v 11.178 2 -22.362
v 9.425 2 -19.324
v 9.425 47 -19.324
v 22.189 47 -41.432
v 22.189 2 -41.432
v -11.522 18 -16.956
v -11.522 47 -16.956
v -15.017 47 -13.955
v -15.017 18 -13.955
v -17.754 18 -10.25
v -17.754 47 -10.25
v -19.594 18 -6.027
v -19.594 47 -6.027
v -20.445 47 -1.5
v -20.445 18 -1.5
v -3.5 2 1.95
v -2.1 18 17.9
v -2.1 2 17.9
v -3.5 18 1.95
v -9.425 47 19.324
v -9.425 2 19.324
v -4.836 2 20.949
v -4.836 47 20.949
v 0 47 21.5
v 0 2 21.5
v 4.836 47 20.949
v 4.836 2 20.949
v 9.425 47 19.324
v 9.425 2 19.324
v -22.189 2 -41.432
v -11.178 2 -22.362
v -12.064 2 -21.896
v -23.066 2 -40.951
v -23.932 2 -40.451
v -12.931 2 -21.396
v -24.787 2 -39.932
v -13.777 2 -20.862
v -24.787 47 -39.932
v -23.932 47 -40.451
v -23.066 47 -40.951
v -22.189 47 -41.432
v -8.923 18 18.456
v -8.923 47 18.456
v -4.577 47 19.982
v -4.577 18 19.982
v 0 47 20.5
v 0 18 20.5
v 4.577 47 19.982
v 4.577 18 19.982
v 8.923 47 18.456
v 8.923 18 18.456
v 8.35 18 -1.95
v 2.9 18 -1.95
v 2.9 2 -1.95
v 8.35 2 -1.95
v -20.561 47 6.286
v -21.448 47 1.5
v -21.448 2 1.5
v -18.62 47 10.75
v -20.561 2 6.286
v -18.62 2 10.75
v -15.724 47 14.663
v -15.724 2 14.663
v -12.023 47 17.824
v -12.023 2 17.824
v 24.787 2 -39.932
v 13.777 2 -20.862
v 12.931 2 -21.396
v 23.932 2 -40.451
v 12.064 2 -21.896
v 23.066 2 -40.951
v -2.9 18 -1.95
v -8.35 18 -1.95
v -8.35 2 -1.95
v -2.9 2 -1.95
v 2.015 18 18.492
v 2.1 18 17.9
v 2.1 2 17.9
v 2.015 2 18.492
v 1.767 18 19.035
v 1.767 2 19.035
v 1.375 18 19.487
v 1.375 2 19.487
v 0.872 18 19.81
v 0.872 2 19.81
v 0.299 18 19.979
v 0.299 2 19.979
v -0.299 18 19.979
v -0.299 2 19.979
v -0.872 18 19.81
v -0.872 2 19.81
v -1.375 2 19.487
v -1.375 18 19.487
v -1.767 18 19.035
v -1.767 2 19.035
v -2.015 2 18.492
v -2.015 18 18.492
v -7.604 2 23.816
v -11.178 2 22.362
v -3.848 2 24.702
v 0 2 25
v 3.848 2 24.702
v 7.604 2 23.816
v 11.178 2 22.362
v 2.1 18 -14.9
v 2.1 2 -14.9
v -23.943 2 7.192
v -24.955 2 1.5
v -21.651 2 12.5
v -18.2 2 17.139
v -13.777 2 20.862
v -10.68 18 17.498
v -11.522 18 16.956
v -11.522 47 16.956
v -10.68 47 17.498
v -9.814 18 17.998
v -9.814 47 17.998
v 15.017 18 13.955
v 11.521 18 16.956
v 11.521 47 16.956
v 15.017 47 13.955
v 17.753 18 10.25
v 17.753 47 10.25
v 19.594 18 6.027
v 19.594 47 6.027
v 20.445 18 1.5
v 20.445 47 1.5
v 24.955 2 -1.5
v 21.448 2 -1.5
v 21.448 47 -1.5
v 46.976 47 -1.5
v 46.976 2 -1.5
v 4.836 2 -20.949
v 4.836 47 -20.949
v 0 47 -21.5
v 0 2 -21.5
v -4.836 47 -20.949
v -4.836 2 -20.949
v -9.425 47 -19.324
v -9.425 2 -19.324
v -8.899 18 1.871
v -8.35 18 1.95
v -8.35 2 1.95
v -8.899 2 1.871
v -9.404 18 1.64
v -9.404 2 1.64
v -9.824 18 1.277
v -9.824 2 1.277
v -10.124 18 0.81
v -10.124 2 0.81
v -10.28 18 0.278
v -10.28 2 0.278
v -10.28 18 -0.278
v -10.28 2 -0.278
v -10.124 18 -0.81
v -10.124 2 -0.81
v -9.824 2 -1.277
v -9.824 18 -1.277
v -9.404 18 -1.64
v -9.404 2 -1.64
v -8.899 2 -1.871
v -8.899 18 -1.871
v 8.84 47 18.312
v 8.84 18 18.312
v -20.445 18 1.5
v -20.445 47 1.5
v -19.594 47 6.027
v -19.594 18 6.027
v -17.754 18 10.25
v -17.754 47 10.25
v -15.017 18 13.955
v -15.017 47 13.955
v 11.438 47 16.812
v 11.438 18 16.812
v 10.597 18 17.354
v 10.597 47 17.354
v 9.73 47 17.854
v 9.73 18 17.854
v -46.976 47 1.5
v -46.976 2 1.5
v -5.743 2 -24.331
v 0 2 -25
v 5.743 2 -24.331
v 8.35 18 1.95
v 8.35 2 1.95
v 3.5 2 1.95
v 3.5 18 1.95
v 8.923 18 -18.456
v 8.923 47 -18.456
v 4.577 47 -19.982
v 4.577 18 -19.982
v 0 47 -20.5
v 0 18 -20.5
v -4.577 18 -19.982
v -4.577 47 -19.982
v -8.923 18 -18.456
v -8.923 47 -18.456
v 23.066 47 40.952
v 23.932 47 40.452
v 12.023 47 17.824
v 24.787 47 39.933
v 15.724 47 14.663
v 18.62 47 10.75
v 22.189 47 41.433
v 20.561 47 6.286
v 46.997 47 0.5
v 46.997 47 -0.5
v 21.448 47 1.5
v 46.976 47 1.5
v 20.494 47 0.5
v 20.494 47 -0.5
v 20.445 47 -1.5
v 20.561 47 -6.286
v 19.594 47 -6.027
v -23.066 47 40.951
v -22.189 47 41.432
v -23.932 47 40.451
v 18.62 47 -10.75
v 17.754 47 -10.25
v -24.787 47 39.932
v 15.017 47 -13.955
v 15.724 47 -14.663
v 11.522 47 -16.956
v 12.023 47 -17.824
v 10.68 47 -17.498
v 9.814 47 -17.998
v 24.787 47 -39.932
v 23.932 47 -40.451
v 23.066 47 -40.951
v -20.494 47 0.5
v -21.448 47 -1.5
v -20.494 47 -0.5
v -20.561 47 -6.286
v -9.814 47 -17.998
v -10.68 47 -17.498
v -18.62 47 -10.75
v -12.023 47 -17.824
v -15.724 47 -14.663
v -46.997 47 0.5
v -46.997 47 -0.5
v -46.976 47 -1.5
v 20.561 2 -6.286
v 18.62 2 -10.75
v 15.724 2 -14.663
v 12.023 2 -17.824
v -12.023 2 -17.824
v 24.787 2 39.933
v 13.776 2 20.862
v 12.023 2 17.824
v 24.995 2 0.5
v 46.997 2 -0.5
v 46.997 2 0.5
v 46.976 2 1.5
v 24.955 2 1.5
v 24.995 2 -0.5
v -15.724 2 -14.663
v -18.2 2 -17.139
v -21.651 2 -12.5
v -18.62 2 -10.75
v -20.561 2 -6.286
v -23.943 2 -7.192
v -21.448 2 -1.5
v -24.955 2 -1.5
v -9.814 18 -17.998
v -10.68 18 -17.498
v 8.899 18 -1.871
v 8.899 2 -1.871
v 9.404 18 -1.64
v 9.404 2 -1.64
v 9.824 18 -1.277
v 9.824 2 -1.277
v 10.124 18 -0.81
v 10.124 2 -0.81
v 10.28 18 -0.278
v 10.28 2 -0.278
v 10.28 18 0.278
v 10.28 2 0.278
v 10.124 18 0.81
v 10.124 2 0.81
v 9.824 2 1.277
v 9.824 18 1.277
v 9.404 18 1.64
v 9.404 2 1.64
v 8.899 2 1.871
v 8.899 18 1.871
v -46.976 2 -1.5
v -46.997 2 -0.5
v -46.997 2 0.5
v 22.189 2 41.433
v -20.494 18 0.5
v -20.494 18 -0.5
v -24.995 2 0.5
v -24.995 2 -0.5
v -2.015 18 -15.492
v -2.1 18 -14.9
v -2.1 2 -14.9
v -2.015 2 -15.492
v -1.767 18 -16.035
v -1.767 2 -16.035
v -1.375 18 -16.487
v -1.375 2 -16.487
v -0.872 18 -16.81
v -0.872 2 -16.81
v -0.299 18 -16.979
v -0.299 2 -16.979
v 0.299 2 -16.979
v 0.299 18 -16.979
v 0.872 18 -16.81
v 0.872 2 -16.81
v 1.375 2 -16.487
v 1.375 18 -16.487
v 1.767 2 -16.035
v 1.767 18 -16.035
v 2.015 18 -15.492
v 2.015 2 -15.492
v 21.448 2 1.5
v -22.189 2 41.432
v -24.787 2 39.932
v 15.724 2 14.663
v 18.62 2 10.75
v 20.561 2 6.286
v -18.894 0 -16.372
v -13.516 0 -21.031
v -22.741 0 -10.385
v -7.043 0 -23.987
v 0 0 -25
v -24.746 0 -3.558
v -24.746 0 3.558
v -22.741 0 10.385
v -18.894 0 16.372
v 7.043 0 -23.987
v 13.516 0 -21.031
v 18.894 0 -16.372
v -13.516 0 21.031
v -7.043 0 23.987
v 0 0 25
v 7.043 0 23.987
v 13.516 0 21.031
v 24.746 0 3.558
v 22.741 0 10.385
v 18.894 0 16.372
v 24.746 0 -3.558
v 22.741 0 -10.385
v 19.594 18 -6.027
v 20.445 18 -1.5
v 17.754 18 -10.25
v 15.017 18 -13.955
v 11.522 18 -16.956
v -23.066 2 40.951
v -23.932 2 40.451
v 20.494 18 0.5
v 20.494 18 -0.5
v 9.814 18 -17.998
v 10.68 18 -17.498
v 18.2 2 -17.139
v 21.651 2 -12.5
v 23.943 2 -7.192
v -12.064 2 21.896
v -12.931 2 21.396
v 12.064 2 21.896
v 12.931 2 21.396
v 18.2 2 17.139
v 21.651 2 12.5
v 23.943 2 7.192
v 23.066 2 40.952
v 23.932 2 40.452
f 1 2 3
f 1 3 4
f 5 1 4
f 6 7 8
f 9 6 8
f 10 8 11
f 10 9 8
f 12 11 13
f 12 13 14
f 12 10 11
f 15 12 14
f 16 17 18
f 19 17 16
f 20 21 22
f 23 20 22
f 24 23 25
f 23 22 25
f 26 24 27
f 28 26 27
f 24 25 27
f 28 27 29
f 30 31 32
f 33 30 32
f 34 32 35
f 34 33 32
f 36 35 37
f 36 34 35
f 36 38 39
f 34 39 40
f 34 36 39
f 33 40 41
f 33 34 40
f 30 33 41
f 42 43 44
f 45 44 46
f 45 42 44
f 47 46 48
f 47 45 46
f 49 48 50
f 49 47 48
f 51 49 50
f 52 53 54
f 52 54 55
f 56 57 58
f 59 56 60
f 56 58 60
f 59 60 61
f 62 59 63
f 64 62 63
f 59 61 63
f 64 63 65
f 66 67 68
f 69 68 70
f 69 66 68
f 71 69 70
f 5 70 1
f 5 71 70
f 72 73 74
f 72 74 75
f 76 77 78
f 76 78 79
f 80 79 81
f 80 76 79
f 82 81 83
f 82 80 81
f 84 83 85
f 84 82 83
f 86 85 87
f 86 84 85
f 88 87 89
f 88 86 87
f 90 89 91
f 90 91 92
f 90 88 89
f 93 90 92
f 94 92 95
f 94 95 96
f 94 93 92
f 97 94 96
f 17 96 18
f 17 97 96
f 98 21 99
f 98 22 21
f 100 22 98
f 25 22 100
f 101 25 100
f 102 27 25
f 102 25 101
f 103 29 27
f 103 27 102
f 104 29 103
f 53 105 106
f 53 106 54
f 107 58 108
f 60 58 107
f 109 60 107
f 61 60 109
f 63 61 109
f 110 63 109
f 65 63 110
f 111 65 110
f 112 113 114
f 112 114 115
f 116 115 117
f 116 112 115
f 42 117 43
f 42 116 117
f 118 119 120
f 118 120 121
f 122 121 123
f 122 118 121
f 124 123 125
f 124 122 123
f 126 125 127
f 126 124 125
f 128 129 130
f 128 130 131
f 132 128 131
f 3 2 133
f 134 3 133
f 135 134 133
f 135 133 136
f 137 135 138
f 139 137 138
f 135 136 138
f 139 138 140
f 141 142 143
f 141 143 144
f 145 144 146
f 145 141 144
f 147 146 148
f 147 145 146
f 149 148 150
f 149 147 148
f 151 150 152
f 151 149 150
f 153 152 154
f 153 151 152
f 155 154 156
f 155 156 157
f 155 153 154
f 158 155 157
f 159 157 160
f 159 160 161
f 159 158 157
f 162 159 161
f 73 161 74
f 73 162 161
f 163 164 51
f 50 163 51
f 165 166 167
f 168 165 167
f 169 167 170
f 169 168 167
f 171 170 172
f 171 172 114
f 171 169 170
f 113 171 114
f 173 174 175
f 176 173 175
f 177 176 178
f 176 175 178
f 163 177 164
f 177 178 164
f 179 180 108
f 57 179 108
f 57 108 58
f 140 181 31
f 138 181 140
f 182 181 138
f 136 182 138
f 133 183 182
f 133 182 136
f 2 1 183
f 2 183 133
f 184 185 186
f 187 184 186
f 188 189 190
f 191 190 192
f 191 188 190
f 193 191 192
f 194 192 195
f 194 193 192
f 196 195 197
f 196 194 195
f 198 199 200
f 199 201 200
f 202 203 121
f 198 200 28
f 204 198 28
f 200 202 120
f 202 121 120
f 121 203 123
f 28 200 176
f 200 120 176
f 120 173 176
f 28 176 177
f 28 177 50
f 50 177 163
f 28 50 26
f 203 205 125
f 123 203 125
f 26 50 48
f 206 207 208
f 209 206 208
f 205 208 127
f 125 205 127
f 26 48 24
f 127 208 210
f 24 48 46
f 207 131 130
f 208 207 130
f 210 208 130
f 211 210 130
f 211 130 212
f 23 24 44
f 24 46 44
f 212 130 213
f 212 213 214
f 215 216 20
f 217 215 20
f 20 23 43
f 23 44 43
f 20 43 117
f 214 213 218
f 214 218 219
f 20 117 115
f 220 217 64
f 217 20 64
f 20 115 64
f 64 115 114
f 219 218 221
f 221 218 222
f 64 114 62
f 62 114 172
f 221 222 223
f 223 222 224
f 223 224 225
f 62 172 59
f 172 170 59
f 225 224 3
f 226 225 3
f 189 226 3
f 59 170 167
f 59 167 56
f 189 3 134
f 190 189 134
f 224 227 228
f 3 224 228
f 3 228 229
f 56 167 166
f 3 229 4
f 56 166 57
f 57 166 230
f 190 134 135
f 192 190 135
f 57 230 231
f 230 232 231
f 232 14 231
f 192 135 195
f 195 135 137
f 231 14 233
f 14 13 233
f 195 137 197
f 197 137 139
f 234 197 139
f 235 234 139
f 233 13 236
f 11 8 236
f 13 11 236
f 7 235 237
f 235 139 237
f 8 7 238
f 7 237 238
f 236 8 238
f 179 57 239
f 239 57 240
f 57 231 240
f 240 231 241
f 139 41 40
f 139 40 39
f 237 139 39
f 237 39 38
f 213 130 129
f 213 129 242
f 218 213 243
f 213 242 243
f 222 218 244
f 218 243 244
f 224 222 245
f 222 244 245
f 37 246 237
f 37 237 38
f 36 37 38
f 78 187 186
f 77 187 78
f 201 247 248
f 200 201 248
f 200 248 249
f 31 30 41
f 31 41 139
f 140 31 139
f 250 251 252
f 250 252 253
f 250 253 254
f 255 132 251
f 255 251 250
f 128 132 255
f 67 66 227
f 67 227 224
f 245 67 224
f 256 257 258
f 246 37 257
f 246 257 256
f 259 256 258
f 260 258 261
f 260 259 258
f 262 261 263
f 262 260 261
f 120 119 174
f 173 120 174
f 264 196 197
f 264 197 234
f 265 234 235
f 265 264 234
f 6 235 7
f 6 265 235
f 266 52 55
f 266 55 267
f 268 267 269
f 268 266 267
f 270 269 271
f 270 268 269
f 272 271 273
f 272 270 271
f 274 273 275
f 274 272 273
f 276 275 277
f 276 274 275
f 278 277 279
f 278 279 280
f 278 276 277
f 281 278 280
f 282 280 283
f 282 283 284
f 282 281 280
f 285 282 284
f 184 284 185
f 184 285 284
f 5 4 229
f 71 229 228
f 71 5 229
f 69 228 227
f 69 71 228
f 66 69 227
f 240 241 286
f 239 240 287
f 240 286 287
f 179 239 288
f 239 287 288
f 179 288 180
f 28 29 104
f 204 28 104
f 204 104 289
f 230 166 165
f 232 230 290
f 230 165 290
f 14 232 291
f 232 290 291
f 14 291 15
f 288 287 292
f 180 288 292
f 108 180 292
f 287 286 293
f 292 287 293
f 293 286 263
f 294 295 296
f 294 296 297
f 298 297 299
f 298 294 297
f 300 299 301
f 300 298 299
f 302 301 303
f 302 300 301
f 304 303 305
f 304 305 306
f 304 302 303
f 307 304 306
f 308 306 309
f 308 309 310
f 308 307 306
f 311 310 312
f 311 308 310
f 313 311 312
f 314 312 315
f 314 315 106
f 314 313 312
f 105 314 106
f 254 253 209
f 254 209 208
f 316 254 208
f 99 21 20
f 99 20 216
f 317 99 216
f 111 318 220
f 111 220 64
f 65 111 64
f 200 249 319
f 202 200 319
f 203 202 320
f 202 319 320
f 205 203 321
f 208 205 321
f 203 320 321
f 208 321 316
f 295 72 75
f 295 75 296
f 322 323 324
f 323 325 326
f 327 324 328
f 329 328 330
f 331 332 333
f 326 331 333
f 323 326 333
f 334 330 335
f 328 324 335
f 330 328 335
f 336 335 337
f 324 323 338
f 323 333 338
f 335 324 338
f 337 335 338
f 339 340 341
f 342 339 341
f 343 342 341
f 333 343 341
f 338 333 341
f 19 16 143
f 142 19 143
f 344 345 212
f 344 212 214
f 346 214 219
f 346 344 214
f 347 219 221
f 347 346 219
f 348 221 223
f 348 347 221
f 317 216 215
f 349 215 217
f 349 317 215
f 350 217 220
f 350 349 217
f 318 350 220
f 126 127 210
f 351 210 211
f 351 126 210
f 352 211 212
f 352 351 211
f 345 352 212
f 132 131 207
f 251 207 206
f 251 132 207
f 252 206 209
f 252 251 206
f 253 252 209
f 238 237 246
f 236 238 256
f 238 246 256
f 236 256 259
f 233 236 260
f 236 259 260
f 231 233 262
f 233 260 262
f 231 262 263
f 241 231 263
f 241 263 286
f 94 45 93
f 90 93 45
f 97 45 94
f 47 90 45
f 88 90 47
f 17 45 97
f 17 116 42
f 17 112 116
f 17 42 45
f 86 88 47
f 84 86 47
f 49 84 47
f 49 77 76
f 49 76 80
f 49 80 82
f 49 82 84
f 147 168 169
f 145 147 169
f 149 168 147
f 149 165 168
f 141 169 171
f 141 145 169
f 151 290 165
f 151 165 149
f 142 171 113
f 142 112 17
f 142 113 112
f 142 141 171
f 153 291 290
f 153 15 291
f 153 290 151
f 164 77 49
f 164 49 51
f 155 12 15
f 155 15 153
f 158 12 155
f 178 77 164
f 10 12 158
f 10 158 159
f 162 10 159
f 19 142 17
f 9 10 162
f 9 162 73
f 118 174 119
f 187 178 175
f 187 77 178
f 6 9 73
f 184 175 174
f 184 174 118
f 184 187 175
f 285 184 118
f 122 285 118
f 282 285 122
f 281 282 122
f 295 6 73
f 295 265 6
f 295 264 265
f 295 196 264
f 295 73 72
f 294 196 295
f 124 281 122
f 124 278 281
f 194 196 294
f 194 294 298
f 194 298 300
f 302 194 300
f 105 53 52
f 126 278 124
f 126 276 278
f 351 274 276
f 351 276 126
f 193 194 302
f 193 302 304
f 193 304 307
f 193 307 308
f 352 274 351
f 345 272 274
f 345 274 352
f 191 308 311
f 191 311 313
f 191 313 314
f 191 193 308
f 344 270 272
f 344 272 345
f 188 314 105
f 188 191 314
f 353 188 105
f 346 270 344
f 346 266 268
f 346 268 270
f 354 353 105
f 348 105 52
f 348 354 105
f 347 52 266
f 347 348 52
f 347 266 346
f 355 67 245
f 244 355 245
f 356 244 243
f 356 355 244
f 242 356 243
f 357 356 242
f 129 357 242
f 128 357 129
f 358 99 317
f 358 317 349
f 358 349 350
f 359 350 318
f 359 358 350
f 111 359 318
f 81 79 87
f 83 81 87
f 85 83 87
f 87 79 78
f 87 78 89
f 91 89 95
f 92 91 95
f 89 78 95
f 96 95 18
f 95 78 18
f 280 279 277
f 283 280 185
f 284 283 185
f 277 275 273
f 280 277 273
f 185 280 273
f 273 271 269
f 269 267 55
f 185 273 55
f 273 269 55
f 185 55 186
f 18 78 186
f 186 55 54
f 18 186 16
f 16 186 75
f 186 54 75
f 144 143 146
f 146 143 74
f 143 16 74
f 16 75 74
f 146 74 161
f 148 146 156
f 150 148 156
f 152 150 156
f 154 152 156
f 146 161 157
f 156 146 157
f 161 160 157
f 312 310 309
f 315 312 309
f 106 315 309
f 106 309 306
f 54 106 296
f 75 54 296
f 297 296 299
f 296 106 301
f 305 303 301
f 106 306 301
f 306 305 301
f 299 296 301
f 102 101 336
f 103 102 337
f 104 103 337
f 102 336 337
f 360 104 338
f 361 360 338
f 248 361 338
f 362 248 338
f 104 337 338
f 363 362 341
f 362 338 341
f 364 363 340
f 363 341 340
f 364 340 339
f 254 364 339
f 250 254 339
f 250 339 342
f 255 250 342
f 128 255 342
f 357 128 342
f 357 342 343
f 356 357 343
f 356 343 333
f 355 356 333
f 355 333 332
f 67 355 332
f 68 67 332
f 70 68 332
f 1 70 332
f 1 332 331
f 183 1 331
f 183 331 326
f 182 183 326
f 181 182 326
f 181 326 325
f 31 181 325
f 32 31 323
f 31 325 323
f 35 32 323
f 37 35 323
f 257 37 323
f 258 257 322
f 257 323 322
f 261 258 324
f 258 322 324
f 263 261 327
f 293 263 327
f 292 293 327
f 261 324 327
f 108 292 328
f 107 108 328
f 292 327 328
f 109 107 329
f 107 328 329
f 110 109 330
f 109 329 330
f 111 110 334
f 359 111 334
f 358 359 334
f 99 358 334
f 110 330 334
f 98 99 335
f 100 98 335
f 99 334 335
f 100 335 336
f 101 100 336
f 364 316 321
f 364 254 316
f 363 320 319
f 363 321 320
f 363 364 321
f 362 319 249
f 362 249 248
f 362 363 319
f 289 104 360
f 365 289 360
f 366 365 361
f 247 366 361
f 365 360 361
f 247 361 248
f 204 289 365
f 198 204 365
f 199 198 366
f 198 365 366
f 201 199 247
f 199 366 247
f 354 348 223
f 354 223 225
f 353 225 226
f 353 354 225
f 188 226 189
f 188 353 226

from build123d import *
from build123d.topology import SkipClean

# Parameters (mm, degrees)
SKETCH_1_R          = 25
EXTRUDE_2_DEPTH     = 2
EXTRUDE_3_DEPTH     = 45
SKETCH_3_R          = 21.5
SKETCH_3_R_2        = 20.5
EXTRUDE_4_DEPTH     = 45
SKETCH_5_R          = 21.5
EXTRUDE_5_DEPTH     = 16
CUT_EXTRUDE_1_DEPTH = 16


with BuildPart() as part:
    # 草图1 → 凸台-拉伸2 (new body)
    with BuildSketch(Plane(origin=(0, 0, 0), x_dir=(1, 0, 0), z_dir=(0, 1, 0))):
        with Locations(Location((0, 0, 0), (0, 0, 270))):
            Circle(SKETCH_1_R)
    extrude(amount=EXTRUDE_2_DEPTH)

    # 草图2 → 凸台-拉伸3 (add)
    with BuildSketch(Plane(origin=(0, 2, 0), x_dir=(1, 0, 0), z_dir=(0, 1, 0))):
        with BuildLine():
            Line((46.976057732, -1.5), (20.4450483, -1.5))
            ThreePointArc((20.4450483, -1.5), (20.5, 0), (20.4450483, 1.5))
            Line((20.4450483, 1.5), (46.976057732, 1.5))
            ThreePointArc((46.976057732, 1.5), (47, 0), (46.976057732, -1.5))
        make_face()
        with BuildLine():
            Line((8.840104317, -18.311509822), (22.189479497, -41.433305883))
            ThreePointArc((22.189479497, -41.433305883), (23.500412361, -40.704084016), (24.787406337, -39.933398601))
            Line((24.787406337, -39.933398601), (11.438034851, -16.811608937))
            ThreePointArc((11.438034851, -16.811608937), (10.166767318, -17.609533741), (8.840104317, -18.311509822))
        make_face()
        with BuildLine():
            Line((-8.923486044, -18.45593121), (-22.18899076, -41.432459365))
            ThreePointArc((-22.18899076, -41.432459365), (-23.5, -40.703193978), (-24.787066971, -39.932459365))
            Line((-24.787066971, -39.932459365), (-11.521562256, -16.95593121))
            ThreePointArc((-11.521562256, -16.95593121), (-10.25, -17.753520778), (-8.923486044, -18.45593121))
        make_face()
        with BuildLine():
            Line((-20.4450483, 1.5), (-46.976057732, 1.5))
            ThreePointArc((-46.976057732, 1.5), (-47, 0), (-46.976057732, -1.5))
            Line((-46.976057732, -1.5), (-20.4450483, -1.5))
            ThreePointArc((-20.4450483, -1.5), (-20.5, 0), (-20.4450483, 1.5))
        make_face()
        with BuildLine():
            Line((-11.521562256, 16.95593121), (-24.787066971, 39.932459365))
            ThreePointArc((-24.787066971, 39.932459365), (-23.5, 40.703193978), (-22.18899076, 41.432459365))
            Line((-22.18899076, 41.432459365), (-8.923486044, 18.45593121))
            ThreePointArc((-8.923486044, 18.45593121), (-10.25, 17.753520778), (-11.521562256, 16.95593121))
        make_face()
        with BuildLine():
            Line((8.923486044, 18.45593121), (22.18899076, 41.432459365))
            ThreePointArc((22.18899076, 41.432459365), (23.5, 40.703193978), (24.787066971, 39.932459365))
            Line((24.787066971, 39.932459365), (11.521562256, 16.95593121))
            ThreePointArc((11.521562256, 16.95593121), (10.25, 17.753520778), (8.923486044, 18.45593121))
        make_face()
    extrude(amount=EXTRUDE_3_DEPTH)

    # 草图3 → 凸台-拉伸4 (add)
    with SkipClean():  # the faces are left unmerged after this step: merging them gives an invalid solid
        with BuildSketch(Plane(origin=(0, 2, 0), x_dir=(1, 0, 0), z_dir=(0, 1, 0))):
            Circle(SKETCH_3_R)
            Circle(SKETCH_3_R_2, mode=Mode.SUBTRACT)
        extrude(amount=EXTRUDE_4_DEPTH)

    # 草图5 → 凸台-拉伸5 (add)
    with BuildSketch(Plane(origin=(0, 2, 0), x_dir=(1, 0, 0), z_dir=(0, 1, 0))):
        Circle(SKETCH_5_R)
    extrude(amount=EXTRUDE_5_DEPTH)

    # 草图6 → 切除-拉伸1 (cut)
    with BuildSketch(Plane(origin=(0, 18, 0), x_dir=(1, 0, 0), z_dir=(0, 1, 0))):
        with BuildLine():
            Line((2.1, 14.9), (2.9, 1.95))
            Line((2.9, 1.95), (8.35, 1.95))
            ThreePointArc((8.35, 1.95), (10.3, 0), (8.35, -1.95))
            Line((8.35, -1.95), (3.5, -1.95))
            Line((3.5, -1.95), (2.1, -17.9))
            ThreePointArc((2.1, -17.9), (0, -20), (-2.1, -17.9))
            Line((-2.1, -17.9), (-3.5, -1.95))
            Line((-3.5, -1.95), (-8.35, -1.95))
            ThreePointArc((-8.35, -1.95), (-10.3, 0), (-8.35, 1.95))
            Line((-8.35, 1.95), (-2.9, 1.95))
            Line((-2.9, 1.95), (-2.1, 14.9))
            ThreePointArc((-2.1, 14.9), (0, 17), (2.1, 14.9))
        make_face()
    extrude(amount=-CUT_EXTRUDE_1_DEPTH, mode=Mode.SUBTRACT)


solid = part.part
